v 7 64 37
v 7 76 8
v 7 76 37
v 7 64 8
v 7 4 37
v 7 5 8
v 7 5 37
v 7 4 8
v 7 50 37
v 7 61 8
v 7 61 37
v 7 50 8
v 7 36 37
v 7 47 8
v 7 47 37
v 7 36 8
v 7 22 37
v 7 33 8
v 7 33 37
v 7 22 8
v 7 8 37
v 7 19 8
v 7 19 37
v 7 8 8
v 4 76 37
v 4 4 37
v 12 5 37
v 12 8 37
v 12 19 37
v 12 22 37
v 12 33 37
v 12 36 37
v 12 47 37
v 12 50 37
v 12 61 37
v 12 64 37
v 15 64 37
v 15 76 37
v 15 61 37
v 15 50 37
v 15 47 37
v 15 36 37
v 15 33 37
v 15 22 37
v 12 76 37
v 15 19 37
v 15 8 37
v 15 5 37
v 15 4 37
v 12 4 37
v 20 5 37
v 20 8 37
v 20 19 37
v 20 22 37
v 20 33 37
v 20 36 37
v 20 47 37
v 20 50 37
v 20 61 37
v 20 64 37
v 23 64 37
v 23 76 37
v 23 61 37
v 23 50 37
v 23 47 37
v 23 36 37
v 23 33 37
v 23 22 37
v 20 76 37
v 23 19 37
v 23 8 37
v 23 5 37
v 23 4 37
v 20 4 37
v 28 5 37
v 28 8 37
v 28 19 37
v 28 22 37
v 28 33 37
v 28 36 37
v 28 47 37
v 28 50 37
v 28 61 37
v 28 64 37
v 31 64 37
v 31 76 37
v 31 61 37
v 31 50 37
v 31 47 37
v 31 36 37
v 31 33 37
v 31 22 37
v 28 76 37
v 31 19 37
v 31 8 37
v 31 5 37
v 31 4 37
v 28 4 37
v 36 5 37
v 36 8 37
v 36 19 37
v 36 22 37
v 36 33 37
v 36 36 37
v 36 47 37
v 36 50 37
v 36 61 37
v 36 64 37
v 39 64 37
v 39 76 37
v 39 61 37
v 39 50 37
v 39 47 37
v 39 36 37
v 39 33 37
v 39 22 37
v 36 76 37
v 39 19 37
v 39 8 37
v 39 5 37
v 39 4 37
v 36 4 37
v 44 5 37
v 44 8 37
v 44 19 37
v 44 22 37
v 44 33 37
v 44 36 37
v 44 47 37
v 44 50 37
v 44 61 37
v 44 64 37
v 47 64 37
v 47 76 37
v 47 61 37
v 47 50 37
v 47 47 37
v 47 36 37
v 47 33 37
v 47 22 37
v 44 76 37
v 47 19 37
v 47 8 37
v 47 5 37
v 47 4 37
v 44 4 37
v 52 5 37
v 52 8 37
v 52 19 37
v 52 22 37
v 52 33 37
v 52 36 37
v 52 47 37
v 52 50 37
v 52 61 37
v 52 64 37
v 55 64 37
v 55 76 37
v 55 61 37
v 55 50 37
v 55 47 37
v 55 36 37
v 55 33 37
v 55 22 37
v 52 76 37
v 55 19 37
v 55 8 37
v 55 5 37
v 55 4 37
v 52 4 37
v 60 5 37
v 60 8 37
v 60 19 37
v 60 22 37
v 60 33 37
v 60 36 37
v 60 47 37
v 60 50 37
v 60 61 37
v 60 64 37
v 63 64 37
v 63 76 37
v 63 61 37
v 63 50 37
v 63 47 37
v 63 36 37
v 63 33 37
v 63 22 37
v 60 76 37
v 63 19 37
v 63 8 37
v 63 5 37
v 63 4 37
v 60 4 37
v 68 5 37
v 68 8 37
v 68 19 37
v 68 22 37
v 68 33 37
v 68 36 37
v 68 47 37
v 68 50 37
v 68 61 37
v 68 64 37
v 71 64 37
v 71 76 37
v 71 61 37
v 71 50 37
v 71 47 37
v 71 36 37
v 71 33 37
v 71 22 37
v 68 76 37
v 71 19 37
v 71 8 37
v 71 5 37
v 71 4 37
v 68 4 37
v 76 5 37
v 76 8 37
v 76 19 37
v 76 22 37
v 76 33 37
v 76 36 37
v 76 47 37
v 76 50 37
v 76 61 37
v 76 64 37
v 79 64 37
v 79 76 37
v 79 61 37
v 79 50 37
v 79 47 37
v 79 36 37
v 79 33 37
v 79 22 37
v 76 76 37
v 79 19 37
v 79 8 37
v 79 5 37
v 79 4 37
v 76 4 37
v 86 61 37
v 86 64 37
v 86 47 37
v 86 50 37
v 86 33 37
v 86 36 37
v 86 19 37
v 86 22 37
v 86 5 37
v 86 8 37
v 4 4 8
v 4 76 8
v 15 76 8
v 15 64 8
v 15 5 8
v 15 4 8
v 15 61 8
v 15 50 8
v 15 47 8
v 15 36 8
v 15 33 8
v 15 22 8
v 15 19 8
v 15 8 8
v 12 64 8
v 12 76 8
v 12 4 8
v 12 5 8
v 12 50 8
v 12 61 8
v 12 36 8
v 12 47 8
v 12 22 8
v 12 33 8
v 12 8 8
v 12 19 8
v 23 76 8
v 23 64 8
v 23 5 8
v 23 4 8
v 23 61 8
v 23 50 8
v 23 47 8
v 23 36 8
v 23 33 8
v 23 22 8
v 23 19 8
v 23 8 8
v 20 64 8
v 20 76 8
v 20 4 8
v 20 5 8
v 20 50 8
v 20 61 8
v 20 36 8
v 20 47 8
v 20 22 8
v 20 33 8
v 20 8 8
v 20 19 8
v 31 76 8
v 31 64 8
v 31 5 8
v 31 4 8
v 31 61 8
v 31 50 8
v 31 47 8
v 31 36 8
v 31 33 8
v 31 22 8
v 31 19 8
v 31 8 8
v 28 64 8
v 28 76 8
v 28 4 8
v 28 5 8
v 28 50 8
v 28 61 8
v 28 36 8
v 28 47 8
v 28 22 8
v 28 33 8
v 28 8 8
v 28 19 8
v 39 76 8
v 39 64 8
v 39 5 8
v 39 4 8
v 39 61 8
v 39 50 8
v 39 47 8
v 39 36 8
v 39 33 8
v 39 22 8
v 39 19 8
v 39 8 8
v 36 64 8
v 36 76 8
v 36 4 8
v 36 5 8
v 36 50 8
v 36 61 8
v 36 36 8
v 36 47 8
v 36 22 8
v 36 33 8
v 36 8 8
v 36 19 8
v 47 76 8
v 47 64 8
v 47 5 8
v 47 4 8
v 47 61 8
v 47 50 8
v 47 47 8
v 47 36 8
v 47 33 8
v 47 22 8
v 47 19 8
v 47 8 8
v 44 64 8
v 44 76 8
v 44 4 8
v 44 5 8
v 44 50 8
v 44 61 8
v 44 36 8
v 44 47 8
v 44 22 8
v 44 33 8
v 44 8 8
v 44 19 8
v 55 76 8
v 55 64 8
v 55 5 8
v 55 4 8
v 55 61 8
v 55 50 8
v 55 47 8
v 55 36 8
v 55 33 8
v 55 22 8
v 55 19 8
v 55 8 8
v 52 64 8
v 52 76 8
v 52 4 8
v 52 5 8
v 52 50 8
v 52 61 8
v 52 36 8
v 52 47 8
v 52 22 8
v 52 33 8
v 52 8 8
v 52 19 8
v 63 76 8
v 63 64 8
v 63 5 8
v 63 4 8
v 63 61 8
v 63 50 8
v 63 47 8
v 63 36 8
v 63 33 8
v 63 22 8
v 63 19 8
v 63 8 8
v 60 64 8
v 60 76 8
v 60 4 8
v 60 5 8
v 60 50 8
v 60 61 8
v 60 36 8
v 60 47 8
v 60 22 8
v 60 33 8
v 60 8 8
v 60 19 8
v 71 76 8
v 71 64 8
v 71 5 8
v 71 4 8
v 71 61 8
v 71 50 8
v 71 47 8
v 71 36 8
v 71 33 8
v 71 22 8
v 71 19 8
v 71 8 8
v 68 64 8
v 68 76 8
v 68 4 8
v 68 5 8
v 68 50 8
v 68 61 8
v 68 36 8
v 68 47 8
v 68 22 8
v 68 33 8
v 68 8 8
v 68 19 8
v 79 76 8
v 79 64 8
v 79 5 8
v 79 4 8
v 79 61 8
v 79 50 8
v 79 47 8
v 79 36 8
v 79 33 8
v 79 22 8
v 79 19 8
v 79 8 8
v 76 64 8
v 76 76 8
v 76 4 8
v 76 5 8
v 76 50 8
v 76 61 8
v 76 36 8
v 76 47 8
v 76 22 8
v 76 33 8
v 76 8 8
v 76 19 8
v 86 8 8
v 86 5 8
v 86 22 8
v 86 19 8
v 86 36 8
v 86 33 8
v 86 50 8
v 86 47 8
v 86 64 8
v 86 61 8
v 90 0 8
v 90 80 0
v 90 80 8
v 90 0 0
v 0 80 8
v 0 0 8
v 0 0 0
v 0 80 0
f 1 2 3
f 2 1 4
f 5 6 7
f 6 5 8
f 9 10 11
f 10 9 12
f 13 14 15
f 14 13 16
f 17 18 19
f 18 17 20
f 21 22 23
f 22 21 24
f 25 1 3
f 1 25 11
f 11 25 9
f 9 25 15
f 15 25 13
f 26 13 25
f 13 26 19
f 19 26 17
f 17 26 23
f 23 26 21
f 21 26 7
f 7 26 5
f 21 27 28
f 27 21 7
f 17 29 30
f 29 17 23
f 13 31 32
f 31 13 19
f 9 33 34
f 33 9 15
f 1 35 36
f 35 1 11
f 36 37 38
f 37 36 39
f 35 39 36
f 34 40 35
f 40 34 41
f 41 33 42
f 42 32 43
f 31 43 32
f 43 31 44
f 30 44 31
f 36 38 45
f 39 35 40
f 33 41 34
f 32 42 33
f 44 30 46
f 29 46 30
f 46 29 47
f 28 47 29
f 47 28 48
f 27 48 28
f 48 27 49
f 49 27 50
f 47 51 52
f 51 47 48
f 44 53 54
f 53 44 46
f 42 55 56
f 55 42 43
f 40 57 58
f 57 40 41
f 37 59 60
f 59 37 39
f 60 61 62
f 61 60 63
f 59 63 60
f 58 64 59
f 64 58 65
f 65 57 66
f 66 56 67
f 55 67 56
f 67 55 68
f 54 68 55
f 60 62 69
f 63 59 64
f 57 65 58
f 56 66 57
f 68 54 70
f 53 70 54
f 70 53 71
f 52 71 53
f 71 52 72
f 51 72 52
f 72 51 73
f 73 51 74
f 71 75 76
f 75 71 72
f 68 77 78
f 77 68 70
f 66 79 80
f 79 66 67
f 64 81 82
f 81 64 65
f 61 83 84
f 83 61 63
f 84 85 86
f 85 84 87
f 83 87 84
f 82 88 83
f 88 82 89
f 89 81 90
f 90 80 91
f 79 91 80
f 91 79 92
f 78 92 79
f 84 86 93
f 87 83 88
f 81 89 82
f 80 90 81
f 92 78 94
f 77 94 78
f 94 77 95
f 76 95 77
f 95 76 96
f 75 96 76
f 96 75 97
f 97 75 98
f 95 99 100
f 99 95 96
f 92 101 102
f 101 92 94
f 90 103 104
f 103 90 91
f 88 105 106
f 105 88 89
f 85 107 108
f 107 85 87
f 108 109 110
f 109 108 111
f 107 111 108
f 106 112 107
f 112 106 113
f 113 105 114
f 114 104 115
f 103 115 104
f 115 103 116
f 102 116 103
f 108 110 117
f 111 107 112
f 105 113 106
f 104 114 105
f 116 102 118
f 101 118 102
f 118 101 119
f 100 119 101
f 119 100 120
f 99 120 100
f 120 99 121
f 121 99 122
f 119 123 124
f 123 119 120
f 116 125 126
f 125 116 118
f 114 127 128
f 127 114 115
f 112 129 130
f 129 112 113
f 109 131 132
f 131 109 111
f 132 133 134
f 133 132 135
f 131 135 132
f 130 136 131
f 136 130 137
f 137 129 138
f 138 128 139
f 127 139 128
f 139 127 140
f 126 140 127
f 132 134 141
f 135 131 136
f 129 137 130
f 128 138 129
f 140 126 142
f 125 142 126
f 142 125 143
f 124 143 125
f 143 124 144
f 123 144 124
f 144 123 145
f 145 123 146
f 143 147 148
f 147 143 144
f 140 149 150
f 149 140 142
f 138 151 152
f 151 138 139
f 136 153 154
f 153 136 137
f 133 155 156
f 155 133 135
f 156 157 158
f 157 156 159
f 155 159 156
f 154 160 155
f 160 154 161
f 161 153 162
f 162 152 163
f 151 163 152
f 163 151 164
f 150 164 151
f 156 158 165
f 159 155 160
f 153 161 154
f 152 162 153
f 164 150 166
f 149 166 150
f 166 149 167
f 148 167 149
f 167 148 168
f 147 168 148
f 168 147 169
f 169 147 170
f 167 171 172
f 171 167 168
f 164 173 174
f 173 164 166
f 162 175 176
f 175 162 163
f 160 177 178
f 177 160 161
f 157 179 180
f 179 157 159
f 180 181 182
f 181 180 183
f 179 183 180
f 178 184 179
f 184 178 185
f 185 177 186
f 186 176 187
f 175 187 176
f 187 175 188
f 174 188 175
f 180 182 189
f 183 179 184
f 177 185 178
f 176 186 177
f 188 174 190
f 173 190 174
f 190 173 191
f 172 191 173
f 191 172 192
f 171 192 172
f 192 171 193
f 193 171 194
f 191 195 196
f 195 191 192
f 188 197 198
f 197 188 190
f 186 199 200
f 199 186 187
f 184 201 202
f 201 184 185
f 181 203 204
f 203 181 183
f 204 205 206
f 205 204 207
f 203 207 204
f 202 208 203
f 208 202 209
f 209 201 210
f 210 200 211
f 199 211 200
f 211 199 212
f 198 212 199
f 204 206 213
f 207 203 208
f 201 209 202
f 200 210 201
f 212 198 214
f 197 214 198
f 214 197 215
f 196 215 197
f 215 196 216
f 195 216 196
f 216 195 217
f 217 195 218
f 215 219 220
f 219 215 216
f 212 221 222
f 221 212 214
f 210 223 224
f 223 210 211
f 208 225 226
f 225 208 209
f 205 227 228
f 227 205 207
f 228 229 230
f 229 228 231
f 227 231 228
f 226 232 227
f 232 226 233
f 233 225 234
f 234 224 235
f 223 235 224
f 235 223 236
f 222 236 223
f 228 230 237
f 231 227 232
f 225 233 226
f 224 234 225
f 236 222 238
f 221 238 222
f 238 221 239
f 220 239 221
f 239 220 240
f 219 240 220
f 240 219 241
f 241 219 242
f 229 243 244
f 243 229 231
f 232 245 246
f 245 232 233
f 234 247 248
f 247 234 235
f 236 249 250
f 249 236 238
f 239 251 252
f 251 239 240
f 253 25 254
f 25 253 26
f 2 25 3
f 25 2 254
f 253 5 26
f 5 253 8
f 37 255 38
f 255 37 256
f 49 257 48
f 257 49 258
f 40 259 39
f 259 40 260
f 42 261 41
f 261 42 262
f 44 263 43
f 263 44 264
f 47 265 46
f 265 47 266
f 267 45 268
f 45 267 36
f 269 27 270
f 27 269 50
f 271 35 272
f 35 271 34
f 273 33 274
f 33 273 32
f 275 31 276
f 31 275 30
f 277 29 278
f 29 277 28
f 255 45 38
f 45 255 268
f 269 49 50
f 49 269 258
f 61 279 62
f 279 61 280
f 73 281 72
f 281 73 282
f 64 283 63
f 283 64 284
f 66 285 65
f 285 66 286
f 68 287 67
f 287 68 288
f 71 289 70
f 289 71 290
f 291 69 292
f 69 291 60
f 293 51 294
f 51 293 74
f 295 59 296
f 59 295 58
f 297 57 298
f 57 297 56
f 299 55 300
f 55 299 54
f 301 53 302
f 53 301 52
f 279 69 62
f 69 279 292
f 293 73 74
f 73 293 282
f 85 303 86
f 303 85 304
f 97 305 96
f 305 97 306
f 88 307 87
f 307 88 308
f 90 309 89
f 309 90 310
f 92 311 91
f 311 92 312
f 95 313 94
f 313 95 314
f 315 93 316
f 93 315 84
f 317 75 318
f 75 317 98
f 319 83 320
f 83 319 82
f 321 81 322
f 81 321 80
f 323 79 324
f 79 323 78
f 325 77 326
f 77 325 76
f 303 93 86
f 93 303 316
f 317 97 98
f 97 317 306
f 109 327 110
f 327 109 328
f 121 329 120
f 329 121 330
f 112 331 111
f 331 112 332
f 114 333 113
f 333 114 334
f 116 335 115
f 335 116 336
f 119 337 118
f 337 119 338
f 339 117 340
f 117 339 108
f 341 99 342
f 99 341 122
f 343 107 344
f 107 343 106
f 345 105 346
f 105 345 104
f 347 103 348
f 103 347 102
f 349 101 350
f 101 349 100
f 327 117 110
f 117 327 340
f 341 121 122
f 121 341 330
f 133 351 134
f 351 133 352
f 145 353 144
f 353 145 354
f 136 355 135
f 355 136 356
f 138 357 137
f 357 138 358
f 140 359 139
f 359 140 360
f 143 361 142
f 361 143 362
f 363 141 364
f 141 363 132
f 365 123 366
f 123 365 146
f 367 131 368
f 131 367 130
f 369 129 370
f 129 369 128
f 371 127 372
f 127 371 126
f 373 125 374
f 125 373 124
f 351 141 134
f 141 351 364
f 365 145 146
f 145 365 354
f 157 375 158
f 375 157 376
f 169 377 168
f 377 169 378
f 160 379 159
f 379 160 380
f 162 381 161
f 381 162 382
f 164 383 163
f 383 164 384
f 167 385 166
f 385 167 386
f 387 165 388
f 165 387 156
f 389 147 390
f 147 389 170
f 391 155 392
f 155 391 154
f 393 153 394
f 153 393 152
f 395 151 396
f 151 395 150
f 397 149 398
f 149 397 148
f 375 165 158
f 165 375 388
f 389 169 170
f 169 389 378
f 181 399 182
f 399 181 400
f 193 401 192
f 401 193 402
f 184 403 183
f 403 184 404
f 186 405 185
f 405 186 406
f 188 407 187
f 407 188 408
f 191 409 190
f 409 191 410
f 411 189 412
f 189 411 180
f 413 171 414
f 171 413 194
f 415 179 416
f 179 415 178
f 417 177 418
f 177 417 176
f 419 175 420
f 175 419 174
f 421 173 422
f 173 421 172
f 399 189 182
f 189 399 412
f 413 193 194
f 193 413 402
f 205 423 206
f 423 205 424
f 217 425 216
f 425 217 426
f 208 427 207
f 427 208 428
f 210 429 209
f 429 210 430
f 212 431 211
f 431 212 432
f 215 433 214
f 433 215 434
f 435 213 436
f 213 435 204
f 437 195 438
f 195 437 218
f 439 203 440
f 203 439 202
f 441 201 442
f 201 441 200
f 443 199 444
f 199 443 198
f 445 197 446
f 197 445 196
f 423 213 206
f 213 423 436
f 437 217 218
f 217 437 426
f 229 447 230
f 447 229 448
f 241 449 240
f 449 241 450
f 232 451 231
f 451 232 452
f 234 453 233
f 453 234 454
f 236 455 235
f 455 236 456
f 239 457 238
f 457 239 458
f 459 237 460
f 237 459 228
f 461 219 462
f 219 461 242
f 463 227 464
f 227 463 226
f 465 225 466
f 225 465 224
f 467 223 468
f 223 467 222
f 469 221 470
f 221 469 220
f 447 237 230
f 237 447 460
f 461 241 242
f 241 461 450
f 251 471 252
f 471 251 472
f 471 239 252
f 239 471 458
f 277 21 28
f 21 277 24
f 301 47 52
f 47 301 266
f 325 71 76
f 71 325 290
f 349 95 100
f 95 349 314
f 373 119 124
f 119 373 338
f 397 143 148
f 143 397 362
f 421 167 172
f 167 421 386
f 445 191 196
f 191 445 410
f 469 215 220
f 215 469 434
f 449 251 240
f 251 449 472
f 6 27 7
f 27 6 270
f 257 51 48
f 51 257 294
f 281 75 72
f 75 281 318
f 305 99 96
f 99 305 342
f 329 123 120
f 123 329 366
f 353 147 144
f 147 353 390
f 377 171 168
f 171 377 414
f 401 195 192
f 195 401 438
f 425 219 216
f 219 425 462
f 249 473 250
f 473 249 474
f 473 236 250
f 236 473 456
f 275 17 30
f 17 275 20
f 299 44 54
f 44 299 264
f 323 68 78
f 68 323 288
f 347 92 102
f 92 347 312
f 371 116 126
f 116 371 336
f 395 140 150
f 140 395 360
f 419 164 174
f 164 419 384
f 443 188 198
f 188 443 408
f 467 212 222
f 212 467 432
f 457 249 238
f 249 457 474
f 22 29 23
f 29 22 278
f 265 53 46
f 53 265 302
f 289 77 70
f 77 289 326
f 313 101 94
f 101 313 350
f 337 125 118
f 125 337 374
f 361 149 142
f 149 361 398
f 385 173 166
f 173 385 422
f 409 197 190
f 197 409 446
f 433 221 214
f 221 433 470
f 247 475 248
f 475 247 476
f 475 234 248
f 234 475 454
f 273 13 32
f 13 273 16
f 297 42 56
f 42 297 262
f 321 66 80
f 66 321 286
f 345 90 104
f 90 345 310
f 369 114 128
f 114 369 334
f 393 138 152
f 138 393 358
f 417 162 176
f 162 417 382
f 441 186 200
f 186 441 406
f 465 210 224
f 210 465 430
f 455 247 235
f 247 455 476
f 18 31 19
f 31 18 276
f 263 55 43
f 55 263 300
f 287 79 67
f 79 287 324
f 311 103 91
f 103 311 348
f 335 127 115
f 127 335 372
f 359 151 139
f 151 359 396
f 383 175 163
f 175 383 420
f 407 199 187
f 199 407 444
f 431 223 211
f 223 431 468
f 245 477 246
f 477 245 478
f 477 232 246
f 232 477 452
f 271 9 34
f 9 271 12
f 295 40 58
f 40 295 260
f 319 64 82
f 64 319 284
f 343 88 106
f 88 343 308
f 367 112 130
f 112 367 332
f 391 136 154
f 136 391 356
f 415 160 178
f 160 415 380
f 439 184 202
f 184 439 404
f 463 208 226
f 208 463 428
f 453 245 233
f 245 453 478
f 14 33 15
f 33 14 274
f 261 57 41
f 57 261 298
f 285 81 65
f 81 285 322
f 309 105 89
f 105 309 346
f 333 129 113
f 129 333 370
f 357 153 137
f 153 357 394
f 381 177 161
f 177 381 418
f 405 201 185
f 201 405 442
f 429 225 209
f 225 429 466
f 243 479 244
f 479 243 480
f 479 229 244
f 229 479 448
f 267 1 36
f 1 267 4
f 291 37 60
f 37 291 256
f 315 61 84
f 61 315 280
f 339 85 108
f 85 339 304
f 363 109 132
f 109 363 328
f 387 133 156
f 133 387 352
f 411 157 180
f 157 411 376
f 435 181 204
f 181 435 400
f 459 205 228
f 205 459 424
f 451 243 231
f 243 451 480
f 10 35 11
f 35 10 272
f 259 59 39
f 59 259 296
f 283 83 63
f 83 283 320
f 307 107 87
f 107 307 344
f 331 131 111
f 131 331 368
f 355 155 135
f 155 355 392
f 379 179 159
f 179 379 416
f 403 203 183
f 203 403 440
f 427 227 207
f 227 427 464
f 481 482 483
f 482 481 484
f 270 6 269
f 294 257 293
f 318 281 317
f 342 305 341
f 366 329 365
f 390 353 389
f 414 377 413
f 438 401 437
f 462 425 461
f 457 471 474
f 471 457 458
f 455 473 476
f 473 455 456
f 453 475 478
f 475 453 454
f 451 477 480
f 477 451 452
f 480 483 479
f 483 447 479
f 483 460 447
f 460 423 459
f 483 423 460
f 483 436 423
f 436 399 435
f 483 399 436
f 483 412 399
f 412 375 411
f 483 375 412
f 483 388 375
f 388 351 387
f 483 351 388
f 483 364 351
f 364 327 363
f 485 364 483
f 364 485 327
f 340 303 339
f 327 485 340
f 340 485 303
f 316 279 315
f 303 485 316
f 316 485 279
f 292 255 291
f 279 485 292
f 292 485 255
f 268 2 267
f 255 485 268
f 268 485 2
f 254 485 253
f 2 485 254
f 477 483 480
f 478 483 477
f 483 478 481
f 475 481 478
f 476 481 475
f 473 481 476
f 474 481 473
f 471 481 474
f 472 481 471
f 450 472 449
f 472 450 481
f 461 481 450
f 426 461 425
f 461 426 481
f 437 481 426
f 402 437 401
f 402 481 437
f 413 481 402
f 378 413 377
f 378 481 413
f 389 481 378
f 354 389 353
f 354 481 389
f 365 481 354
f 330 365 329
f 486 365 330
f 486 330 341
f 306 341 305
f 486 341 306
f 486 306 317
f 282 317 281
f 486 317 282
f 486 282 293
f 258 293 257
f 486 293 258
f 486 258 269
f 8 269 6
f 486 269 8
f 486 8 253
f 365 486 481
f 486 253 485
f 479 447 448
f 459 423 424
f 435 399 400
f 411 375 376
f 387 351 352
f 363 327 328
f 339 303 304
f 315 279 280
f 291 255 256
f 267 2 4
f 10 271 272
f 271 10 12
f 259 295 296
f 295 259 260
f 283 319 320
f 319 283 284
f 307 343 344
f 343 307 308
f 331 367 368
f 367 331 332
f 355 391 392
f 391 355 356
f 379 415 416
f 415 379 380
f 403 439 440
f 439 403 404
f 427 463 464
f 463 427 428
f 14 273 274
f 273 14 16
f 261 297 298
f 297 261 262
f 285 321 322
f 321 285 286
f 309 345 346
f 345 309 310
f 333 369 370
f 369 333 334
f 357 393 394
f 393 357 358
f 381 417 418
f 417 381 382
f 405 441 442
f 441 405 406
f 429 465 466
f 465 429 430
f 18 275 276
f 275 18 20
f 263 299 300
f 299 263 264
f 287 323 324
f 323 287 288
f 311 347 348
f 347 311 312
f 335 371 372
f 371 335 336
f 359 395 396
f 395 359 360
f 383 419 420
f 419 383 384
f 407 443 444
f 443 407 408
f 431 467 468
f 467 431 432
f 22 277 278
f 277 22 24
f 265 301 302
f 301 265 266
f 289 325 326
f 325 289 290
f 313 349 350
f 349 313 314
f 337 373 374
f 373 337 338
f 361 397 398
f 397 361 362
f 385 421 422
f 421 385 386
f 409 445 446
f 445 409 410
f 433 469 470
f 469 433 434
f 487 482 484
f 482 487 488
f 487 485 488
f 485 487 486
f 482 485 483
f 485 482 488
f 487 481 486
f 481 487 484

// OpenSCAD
$fn = 32;

// ----------------------------------------------------------------------
// Heatsink: cross fin block
// ----------------------------------------------------------------------

// --- parameters (mm) ---
base_l = 90;              // base length, X
base_w = 80;              // base width, Y
base_t = 8;               // base plate thickness
fin_h = 30;               // fin height above the base
fin_t = 3;                // fin thickness
edge = 4;                 // margin from the base ends
pitch = 8;                // fin pitch
rib_pitch = 14;           // cross rib pitch

n_fins = floor((base_l - 2 * edge - fin_t) / pitch) + 1;  // fin count
total_h = base_t + fin_h - 1;  // overall height
n_ribs = floor((base_w - 2 * edge) / rib_pitch);  // rib count

union() {
  cube([base_l, base_w, base_t]);
  for (i = [0 : n_fins - 1])
    translate([edge + i * pitch, edge, base_t - 1])
      cube([fin_t, base_w - 2 * edge, fin_h]);
  for (i = [0 : n_ribs - 1])
    translate([edge, edge + 1 + i * rib_pitch, base_t - 1])
      cube([base_l - 2 * edge, fin_t, fin_h]);
}
